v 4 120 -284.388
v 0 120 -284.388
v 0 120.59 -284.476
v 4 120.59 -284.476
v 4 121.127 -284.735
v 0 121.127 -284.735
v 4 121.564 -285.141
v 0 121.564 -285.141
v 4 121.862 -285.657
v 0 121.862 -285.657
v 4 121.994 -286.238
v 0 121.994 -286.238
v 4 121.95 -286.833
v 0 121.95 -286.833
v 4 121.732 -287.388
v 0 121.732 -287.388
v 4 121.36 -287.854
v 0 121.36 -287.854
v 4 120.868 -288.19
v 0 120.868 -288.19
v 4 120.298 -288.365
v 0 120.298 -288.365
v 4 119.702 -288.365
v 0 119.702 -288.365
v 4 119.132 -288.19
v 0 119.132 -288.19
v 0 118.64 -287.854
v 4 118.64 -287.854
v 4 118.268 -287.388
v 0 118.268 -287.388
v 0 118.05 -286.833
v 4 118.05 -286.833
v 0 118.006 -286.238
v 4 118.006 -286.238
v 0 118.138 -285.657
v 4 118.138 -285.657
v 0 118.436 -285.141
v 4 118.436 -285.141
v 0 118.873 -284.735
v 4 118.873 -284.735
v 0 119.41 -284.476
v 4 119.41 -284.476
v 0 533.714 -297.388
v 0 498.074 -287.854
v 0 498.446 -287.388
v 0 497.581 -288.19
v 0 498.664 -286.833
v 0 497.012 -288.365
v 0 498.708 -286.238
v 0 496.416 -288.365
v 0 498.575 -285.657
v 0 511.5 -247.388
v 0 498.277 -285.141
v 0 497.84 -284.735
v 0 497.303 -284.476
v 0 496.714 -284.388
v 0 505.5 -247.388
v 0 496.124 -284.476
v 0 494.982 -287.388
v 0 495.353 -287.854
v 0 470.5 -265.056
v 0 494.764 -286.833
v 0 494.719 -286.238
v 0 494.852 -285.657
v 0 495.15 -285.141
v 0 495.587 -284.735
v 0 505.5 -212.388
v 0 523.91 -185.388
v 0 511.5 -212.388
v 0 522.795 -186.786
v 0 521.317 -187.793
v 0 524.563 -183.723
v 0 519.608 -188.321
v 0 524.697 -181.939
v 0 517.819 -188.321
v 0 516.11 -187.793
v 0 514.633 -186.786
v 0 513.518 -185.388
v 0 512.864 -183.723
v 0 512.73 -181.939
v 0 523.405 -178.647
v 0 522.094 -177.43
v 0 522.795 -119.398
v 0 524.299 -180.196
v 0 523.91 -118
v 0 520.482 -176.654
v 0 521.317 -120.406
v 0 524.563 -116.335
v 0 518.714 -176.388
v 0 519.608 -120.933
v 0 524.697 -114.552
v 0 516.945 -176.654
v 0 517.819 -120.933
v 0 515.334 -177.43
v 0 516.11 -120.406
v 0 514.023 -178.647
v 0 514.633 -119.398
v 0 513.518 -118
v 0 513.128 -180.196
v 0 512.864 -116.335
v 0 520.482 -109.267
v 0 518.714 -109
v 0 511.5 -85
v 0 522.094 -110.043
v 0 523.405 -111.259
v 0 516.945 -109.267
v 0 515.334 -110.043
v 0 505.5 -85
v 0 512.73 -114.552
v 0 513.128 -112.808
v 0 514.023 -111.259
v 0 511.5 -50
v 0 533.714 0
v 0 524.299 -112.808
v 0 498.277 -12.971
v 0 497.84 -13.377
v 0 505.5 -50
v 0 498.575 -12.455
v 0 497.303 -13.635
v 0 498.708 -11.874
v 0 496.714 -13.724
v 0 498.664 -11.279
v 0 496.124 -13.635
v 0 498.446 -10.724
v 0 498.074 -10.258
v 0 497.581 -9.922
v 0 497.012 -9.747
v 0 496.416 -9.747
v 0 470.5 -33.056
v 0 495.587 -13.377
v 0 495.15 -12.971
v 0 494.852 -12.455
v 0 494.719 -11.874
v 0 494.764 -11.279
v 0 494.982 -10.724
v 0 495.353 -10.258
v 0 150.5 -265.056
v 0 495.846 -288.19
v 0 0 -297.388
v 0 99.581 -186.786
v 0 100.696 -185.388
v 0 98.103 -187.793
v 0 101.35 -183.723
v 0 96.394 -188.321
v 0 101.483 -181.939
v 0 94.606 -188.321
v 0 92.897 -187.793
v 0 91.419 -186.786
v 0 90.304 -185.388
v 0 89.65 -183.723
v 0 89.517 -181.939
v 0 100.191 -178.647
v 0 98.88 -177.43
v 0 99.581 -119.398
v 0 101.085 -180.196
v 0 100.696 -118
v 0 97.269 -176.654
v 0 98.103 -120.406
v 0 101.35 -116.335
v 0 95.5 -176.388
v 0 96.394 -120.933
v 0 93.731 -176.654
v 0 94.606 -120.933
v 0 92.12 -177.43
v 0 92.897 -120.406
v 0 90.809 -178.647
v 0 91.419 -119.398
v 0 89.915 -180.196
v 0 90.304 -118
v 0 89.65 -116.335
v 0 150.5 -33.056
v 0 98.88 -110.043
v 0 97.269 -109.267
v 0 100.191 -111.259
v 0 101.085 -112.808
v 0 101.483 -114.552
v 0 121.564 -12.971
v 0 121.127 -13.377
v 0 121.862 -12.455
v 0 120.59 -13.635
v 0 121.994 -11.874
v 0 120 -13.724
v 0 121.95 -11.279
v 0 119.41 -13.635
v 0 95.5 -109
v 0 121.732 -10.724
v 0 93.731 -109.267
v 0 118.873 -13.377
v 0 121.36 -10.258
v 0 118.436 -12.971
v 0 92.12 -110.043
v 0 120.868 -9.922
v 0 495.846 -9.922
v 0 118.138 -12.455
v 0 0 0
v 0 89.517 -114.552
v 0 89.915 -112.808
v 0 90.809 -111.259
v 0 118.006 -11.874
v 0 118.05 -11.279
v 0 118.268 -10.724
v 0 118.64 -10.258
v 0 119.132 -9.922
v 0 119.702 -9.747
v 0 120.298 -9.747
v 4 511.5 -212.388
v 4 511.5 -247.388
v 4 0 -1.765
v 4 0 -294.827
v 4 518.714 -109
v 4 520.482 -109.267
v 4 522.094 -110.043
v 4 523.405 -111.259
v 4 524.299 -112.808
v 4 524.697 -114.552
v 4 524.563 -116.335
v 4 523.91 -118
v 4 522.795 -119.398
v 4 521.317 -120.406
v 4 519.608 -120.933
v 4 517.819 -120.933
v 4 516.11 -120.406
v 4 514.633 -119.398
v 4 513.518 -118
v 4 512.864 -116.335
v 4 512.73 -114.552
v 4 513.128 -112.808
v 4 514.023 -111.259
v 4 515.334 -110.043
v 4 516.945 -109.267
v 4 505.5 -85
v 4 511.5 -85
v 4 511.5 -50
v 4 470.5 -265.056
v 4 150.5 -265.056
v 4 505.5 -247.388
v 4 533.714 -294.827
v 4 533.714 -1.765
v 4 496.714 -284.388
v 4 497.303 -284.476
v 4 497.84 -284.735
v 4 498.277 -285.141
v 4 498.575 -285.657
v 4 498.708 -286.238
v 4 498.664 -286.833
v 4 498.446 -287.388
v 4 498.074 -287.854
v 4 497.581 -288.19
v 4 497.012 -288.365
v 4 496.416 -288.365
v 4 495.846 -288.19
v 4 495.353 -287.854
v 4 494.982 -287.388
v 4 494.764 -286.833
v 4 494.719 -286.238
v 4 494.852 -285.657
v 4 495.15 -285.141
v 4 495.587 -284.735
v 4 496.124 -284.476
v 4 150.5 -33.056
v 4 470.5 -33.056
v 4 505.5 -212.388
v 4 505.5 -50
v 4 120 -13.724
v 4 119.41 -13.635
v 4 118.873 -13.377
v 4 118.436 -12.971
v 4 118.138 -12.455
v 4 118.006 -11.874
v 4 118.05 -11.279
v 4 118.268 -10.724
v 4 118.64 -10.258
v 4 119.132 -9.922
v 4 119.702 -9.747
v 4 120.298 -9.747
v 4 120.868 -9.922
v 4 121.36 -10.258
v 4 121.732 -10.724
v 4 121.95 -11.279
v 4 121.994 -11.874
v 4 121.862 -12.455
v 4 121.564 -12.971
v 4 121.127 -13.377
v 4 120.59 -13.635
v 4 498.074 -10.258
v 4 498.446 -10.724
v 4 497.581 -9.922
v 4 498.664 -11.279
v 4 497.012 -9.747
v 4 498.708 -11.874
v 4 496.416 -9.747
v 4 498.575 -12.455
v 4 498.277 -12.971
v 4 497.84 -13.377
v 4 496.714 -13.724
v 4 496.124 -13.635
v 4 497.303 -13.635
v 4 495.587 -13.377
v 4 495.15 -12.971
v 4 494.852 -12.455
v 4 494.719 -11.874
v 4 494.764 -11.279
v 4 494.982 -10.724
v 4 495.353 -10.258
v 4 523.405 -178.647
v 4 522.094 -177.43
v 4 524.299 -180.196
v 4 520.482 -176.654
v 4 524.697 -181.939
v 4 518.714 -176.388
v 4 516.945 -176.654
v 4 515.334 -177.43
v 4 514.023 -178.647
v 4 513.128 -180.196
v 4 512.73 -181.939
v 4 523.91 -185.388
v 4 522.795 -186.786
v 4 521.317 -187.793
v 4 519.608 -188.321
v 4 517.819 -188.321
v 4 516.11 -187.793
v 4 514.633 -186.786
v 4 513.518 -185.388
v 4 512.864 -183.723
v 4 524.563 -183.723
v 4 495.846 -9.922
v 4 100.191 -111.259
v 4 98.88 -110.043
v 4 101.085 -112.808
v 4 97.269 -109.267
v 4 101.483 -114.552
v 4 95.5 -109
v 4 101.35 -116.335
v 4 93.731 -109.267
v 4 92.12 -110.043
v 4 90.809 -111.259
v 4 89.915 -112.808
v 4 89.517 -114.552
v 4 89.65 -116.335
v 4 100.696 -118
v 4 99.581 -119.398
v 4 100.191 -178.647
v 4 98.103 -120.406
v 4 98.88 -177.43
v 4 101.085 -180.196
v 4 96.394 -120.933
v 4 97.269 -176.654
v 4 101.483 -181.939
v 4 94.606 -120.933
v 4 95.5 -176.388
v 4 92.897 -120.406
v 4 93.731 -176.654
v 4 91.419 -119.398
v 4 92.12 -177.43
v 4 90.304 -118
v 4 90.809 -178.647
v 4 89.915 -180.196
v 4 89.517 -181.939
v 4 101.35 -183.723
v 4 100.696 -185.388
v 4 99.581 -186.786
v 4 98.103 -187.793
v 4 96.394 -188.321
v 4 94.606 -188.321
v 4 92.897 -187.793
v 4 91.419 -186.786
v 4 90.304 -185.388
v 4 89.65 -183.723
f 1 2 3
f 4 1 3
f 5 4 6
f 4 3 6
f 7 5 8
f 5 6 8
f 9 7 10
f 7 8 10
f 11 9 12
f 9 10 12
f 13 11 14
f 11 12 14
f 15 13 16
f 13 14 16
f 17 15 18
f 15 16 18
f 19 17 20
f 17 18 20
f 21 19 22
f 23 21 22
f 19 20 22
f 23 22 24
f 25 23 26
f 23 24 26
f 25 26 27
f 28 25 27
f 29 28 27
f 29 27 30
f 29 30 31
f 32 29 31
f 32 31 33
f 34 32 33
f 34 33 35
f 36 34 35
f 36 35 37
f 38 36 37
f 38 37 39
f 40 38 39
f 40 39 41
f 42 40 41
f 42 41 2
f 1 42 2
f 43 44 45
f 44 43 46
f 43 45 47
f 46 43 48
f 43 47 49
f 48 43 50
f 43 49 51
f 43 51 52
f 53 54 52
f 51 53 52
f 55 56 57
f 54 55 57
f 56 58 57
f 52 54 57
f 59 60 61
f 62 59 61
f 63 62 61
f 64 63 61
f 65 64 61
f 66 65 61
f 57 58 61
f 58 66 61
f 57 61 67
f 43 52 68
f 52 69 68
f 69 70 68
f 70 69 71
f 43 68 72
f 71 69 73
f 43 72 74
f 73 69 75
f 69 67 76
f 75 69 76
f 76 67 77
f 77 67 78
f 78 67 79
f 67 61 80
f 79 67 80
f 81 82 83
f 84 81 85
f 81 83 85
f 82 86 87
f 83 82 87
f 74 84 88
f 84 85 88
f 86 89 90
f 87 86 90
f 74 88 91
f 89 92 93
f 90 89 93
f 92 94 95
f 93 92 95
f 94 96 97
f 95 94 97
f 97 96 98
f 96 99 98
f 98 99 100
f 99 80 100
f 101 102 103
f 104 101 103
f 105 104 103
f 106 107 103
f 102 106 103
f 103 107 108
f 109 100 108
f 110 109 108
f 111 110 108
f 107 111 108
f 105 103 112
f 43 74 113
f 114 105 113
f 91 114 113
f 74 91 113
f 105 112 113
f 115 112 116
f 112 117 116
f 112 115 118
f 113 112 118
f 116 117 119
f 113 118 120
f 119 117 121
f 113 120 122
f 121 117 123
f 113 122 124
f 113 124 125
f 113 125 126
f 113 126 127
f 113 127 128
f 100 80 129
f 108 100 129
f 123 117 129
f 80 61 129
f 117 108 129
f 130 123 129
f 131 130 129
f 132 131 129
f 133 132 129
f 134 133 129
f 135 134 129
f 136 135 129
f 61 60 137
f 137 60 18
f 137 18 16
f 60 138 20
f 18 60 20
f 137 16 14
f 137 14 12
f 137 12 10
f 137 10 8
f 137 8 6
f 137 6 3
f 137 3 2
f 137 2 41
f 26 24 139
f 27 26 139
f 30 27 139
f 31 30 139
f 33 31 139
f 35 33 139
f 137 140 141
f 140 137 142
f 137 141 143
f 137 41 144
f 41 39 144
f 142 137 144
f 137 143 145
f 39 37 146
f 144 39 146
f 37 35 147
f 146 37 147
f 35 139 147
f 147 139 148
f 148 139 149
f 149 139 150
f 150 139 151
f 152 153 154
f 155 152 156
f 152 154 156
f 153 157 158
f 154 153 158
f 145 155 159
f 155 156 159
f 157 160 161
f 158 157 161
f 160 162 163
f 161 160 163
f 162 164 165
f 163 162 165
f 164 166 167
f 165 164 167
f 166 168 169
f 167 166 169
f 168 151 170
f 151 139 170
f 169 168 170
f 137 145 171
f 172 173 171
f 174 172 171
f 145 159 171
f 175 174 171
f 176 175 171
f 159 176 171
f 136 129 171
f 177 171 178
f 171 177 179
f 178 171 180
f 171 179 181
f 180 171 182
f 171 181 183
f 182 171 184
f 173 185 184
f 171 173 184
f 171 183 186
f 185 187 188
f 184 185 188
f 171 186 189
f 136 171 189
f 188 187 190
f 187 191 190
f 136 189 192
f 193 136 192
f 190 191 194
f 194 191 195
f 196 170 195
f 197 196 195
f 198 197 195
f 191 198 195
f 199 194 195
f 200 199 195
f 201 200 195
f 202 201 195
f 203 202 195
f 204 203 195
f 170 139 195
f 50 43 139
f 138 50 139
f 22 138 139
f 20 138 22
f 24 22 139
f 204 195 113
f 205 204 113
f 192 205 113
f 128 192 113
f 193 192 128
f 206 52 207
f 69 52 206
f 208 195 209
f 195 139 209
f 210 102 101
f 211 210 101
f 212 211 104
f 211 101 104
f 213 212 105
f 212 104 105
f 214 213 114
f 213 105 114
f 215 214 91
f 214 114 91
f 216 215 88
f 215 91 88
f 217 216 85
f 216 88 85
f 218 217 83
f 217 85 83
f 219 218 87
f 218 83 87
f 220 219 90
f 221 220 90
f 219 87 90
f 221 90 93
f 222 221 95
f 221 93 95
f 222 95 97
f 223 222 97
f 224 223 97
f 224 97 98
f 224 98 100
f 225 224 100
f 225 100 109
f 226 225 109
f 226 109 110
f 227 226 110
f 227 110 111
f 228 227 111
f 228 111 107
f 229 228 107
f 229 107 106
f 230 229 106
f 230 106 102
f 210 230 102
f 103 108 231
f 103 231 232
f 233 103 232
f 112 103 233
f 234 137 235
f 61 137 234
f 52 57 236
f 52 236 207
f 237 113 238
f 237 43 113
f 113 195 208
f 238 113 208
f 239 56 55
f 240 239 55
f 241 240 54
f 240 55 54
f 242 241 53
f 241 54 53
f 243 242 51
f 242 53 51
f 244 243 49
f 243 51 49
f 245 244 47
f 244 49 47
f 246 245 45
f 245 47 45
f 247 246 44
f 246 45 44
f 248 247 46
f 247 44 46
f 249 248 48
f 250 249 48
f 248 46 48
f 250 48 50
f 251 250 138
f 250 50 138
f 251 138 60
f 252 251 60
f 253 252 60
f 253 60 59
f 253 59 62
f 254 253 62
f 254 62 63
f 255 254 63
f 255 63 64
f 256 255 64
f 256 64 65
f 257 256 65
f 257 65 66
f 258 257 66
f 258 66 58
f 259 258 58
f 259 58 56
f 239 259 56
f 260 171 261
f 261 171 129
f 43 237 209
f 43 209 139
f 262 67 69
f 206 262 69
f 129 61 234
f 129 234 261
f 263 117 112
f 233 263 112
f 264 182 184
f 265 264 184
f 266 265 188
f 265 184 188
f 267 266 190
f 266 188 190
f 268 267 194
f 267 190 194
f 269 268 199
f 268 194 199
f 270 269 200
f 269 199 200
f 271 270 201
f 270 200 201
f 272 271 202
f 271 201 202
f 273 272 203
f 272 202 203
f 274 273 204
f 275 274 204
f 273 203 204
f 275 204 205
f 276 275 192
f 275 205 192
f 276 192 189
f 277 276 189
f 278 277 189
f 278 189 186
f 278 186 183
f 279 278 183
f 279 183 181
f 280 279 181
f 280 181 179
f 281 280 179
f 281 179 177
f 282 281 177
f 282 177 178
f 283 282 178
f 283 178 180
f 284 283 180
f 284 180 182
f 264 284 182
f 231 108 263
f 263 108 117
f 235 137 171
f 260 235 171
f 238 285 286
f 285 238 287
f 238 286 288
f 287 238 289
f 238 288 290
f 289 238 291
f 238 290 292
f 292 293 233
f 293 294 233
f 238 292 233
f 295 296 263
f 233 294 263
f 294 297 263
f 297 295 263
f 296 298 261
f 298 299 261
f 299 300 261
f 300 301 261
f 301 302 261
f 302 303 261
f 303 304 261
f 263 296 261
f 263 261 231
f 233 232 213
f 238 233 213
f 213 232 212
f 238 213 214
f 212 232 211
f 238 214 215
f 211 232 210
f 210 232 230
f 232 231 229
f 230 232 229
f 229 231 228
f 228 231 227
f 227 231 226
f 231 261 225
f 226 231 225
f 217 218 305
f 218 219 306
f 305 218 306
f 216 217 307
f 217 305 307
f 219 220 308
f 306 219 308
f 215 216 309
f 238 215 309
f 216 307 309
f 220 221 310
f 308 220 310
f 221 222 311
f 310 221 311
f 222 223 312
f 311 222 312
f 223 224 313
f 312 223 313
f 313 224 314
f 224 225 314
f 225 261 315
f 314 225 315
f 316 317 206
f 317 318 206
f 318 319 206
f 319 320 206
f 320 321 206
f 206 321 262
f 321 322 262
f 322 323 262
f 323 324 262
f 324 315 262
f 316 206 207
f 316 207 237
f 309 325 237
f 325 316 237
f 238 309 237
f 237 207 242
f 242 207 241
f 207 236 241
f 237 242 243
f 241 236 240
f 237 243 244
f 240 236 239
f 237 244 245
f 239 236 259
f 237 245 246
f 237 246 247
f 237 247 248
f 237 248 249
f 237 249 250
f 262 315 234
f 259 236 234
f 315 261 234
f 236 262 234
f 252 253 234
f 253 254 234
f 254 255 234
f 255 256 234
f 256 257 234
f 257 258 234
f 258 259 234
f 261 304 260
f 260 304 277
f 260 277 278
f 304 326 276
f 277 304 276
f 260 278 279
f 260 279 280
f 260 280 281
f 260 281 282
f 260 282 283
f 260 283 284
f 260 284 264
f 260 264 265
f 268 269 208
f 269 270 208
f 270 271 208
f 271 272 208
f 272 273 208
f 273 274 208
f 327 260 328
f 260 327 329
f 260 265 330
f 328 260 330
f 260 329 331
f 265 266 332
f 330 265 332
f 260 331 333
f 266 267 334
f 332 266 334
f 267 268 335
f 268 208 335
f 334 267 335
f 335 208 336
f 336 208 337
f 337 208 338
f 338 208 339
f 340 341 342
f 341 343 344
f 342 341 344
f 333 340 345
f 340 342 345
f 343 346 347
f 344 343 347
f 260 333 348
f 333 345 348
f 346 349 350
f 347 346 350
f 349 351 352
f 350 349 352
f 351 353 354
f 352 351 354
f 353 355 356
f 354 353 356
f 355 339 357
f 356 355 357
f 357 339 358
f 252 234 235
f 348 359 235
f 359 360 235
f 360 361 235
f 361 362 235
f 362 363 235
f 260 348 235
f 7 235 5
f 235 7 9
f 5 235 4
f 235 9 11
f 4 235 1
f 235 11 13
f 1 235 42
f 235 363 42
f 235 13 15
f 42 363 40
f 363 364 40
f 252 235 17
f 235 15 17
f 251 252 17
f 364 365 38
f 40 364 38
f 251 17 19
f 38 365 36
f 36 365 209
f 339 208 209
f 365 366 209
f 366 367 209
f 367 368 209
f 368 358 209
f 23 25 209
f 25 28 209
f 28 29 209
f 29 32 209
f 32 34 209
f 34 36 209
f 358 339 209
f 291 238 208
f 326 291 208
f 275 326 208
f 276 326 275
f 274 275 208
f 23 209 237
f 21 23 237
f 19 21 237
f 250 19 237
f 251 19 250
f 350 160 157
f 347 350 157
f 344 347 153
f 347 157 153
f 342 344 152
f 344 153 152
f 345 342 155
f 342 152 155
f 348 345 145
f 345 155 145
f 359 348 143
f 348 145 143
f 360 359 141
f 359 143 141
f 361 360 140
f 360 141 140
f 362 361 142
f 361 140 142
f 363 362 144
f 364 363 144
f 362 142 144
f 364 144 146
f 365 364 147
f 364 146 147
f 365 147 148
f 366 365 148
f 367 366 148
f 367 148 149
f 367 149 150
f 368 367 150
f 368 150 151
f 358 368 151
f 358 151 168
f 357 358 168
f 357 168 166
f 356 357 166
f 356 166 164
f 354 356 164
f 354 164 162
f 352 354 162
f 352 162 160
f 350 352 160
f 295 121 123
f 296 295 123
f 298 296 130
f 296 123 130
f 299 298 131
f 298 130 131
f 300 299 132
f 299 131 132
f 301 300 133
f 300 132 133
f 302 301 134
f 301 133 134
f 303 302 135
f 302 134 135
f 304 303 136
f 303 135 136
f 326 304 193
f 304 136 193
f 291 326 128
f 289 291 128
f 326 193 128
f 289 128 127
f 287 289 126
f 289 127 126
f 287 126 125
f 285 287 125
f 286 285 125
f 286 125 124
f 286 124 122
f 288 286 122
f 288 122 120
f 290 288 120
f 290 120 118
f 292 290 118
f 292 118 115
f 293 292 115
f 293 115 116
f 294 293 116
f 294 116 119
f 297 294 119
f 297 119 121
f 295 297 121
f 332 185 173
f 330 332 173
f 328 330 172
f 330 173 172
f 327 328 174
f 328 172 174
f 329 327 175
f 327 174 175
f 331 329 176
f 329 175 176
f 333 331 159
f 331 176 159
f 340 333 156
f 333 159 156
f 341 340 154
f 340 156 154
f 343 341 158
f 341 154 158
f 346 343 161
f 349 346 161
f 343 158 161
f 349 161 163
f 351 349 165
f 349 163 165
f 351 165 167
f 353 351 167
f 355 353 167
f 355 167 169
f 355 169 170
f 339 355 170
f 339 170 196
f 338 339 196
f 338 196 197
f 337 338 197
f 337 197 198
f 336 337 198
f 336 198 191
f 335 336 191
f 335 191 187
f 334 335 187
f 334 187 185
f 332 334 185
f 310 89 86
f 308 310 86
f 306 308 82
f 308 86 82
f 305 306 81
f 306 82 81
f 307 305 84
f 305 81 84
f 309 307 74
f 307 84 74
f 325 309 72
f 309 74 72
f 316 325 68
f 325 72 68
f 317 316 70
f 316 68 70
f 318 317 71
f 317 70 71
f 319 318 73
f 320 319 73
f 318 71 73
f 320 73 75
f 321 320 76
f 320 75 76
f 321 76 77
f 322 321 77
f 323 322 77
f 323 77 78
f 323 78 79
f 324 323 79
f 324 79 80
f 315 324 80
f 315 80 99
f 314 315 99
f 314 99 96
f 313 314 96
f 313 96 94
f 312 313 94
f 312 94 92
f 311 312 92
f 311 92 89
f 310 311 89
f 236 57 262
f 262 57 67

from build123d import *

# Parameters (mm, degrees)
EXTRUDE_1_DEPTH    = 533.713673317
SKETCH1_W          = 232
SKETCH1_H          = 320
CUT_EXTRUDE1_DEPTH = 611.987450173
SKETCH2_W          = 35
SKETCH2_H          = 6
CUT_EXTRUDE2_DEPTH = 611.987450173
SKETCH3_R          = 6
CUT_EXTRUDE3_DEPTH = 611.987450173
SKETCH4_R          = 2
CUT_EXTRUDE4_DEPTH = 611.987450173


with BuildPart() as part:
    # Эскиз1 → Вытянуть1 (new body)
    with BuildSketch(Plane(origin=(0, 0, 0), x_dir=(1, 0, 0), z_dir=(0, 1, 0))):
        Polygon((0, 0), (4, 1.764508657), (4, 294.827324918), (0, 297.387590837), align=None)
    extrude(amount=EXTRUDE_1_DEPTH)

    # Sketch1 → Cut-Extrude1 (cut, through all)
    with BuildSketch(Plane.ZY):
        with Locations((-149.055893529, 310.5)):
            Rectangle(SKETCH1_W, SKETCH1_H)
    extrude(amount=-CUT_EXTRUDE1_DEPTH, mode=Mode.SUBTRACT)

    # Sketch2 → Cut-Extrude2 (cut, through all)
    with BuildSketch(Plane.ZY):
        with Locations((-229.887590837, 508.5)):
            Rectangle(SKETCH2_W, SKETCH2_H)
        with Locations((-67.5, 508.5)):
            Rectangle(SKETCH2_W, SKETCH2_H)
    extrude(amount=-CUT_EXTRUDE2_DEPTH, mode=Mode.SUBTRACT)

    # Sketch3 → Cut-Extrude3 (cut, through all)
    with BuildSketch(Plane.ZY):
        with Locations((-182.387590837, 518.713673317)):
            Circle(SKETCH3_R)
        with Locations((-115, 518.713673317)):
            Circle(SKETCH3_R)
        with Locations((-182.387590837, 95.5)):
            Circle(SKETCH3_R)
        with Locations((-115, 95.5)):
            Circle(SKETCH3_R)
    extrude(amount=-CUT_EXTRUDE3_DEPTH, mode=Mode.SUBTRACT)

    # Sketch4 → Cut-Extrude4 (cut, through all)
    with BuildSketch(Plane.ZY):
        with Locations((-286.387590837, 496.713673317)):
            Circle(SKETCH4_R)
        with Locations(Location((-11.724196221, 496.713673317, 0), (0, 0, 180))):
            Circle(SKETCH4_R)
        with Locations((-286.387590837, 120)):
            Circle(SKETCH4_R)
        with Locations(Location((-11.724196221, 120, 0), (0, 0, 180))):
            Circle(SKETCH4_R)
    extrude(amount=-CUT_EXTRUDE4_DEPTH, mode=Mode.SUBTRACT)


solid = part.part
